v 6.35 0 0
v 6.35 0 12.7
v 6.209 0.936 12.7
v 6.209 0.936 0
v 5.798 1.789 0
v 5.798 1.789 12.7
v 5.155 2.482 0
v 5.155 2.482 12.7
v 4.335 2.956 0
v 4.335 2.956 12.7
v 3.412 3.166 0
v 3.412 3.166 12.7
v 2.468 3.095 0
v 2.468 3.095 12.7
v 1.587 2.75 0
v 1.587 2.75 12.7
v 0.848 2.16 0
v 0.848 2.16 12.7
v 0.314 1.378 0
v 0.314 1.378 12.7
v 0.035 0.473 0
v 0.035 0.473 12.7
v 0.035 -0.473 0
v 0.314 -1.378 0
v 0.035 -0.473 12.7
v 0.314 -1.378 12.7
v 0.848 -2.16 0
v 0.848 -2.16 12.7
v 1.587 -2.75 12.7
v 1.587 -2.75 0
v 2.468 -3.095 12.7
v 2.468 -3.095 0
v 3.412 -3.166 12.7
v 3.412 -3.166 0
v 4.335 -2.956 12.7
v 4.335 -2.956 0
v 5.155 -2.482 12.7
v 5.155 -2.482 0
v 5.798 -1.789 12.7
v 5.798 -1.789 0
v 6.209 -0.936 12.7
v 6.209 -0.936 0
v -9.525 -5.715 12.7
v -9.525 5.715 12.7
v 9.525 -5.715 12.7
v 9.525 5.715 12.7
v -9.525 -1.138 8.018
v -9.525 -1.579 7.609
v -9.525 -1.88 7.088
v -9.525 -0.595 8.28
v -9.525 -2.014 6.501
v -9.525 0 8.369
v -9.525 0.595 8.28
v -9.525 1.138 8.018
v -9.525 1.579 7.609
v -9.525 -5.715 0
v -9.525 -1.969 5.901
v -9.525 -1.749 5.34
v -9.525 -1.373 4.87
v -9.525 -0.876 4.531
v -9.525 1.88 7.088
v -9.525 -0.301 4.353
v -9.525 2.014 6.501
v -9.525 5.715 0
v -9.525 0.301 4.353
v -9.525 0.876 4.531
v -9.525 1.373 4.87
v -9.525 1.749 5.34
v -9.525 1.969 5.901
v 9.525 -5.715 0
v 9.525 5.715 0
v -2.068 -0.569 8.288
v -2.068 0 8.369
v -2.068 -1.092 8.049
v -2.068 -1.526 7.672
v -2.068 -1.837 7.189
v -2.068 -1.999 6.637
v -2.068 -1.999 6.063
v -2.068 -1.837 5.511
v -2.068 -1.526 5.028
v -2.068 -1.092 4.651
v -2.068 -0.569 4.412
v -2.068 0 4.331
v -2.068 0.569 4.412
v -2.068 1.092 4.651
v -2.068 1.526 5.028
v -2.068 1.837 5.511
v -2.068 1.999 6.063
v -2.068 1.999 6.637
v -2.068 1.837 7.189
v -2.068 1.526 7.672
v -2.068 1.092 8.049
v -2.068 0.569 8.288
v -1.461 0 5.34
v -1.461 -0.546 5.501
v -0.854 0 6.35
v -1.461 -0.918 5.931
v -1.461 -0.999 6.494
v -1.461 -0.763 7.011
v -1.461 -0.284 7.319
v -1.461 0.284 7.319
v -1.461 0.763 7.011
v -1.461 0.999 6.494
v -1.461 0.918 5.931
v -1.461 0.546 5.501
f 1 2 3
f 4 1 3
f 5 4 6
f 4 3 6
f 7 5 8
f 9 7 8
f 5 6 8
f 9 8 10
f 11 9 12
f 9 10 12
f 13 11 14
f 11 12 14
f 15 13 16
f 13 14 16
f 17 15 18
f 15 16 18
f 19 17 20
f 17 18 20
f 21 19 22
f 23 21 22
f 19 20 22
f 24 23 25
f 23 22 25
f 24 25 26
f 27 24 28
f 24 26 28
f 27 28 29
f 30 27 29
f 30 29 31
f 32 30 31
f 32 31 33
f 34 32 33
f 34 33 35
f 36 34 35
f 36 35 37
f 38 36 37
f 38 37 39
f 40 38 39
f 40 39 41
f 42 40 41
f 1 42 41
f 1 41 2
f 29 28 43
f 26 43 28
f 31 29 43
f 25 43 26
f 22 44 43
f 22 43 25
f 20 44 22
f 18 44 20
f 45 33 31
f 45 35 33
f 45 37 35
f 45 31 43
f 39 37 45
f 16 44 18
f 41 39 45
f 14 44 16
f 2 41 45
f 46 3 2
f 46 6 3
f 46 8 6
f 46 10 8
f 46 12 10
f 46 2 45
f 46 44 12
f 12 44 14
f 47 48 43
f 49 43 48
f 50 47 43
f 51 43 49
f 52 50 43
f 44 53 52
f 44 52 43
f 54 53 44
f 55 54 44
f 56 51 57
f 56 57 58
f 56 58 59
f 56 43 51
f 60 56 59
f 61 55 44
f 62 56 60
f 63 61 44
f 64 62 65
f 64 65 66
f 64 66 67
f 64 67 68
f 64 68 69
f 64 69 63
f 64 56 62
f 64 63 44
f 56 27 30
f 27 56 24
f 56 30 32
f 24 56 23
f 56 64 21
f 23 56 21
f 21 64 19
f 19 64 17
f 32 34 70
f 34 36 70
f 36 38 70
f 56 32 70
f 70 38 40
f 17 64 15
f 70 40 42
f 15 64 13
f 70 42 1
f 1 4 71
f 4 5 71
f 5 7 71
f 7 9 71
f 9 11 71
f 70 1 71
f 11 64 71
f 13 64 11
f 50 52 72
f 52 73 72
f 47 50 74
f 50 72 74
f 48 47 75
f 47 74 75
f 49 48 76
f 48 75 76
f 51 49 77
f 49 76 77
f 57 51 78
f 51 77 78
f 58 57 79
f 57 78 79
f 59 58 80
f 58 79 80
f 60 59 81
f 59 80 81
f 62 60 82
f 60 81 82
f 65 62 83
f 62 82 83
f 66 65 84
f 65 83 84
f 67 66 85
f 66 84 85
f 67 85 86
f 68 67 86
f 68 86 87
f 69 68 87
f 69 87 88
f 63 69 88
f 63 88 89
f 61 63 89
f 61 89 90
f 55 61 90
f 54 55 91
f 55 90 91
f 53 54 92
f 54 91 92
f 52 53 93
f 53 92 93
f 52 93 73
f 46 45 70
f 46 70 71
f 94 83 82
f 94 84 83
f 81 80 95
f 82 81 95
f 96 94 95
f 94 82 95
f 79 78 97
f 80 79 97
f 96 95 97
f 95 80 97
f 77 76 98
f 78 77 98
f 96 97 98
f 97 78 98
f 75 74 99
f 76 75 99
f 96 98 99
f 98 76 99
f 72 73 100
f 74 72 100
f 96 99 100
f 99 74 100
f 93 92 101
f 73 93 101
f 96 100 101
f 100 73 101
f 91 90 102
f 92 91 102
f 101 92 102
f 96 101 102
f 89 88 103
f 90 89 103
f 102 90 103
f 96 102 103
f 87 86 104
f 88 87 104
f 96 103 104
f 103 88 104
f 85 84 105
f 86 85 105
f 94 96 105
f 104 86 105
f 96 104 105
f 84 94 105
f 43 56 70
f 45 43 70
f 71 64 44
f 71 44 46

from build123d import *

# Parameters (mm, degrees)
SKETCH1_W                  = 19.05
SKETCH1_H                  = 11.43
BOSS_EXTRUDE1_DEPTH        = 12.7
SKETCH3_R                  = 3.175
CUT_EXTRUDE1_DEPTH         = 17.872369425
F_10_32_TAPPED_HOLE3_D     = 4.0386
F_10_32_TAPPED_HOLE3_DEPTH = 7.45744
F_10_32_TAPPED_HOLE3_TIP   = 1.213317848


with BuildPart() as part:
    # Sketch1 → Boss-Extrude1 (new body)
    with BuildSketch(Plane.XY):
        Rectangle(SKETCH1_W, SKETCH1_H)
    extrude(amount=BOSS_EXTRUDE1_DEPTH)

    # Sketch3 → Cut-Extrude1 (cut, through all)
    with BuildSketch(Plane.XY.offset(12.7)):
        with Locations((3.175, 0)):
            Circle(SKETCH3_R)
    extrude(amount=-CUT_EXTRUDE1_DEPTH, mode=Mode.SUBTRACT)

    # #10-32 Tapped Hole3
    with Locations(Plane(origin=(-9.525, 0, 6.35), x_dir=(0, 0, -1), z_dir=(-1, 0, 0))):
        with Locations((0, 0)):
            Hole(F_10_32_TAPPED_HOLE3_D / 2, depth=F_10_32_TAPPED_HOLE3_DEPTH)
            with Locations((0, 0, -(F_10_32_TAPPED_HOLE3_DEPTH + F_10_32_TAPPED_HOLE3_TIP / 2))):  # 118° drill point
                Cone(0, F_10_32_TAPPED_HOLE3_D / 2, F_10_32_TAPPED_HOLE3_TIP, mode=Mode.SUBTRACT)


solid = part.part
